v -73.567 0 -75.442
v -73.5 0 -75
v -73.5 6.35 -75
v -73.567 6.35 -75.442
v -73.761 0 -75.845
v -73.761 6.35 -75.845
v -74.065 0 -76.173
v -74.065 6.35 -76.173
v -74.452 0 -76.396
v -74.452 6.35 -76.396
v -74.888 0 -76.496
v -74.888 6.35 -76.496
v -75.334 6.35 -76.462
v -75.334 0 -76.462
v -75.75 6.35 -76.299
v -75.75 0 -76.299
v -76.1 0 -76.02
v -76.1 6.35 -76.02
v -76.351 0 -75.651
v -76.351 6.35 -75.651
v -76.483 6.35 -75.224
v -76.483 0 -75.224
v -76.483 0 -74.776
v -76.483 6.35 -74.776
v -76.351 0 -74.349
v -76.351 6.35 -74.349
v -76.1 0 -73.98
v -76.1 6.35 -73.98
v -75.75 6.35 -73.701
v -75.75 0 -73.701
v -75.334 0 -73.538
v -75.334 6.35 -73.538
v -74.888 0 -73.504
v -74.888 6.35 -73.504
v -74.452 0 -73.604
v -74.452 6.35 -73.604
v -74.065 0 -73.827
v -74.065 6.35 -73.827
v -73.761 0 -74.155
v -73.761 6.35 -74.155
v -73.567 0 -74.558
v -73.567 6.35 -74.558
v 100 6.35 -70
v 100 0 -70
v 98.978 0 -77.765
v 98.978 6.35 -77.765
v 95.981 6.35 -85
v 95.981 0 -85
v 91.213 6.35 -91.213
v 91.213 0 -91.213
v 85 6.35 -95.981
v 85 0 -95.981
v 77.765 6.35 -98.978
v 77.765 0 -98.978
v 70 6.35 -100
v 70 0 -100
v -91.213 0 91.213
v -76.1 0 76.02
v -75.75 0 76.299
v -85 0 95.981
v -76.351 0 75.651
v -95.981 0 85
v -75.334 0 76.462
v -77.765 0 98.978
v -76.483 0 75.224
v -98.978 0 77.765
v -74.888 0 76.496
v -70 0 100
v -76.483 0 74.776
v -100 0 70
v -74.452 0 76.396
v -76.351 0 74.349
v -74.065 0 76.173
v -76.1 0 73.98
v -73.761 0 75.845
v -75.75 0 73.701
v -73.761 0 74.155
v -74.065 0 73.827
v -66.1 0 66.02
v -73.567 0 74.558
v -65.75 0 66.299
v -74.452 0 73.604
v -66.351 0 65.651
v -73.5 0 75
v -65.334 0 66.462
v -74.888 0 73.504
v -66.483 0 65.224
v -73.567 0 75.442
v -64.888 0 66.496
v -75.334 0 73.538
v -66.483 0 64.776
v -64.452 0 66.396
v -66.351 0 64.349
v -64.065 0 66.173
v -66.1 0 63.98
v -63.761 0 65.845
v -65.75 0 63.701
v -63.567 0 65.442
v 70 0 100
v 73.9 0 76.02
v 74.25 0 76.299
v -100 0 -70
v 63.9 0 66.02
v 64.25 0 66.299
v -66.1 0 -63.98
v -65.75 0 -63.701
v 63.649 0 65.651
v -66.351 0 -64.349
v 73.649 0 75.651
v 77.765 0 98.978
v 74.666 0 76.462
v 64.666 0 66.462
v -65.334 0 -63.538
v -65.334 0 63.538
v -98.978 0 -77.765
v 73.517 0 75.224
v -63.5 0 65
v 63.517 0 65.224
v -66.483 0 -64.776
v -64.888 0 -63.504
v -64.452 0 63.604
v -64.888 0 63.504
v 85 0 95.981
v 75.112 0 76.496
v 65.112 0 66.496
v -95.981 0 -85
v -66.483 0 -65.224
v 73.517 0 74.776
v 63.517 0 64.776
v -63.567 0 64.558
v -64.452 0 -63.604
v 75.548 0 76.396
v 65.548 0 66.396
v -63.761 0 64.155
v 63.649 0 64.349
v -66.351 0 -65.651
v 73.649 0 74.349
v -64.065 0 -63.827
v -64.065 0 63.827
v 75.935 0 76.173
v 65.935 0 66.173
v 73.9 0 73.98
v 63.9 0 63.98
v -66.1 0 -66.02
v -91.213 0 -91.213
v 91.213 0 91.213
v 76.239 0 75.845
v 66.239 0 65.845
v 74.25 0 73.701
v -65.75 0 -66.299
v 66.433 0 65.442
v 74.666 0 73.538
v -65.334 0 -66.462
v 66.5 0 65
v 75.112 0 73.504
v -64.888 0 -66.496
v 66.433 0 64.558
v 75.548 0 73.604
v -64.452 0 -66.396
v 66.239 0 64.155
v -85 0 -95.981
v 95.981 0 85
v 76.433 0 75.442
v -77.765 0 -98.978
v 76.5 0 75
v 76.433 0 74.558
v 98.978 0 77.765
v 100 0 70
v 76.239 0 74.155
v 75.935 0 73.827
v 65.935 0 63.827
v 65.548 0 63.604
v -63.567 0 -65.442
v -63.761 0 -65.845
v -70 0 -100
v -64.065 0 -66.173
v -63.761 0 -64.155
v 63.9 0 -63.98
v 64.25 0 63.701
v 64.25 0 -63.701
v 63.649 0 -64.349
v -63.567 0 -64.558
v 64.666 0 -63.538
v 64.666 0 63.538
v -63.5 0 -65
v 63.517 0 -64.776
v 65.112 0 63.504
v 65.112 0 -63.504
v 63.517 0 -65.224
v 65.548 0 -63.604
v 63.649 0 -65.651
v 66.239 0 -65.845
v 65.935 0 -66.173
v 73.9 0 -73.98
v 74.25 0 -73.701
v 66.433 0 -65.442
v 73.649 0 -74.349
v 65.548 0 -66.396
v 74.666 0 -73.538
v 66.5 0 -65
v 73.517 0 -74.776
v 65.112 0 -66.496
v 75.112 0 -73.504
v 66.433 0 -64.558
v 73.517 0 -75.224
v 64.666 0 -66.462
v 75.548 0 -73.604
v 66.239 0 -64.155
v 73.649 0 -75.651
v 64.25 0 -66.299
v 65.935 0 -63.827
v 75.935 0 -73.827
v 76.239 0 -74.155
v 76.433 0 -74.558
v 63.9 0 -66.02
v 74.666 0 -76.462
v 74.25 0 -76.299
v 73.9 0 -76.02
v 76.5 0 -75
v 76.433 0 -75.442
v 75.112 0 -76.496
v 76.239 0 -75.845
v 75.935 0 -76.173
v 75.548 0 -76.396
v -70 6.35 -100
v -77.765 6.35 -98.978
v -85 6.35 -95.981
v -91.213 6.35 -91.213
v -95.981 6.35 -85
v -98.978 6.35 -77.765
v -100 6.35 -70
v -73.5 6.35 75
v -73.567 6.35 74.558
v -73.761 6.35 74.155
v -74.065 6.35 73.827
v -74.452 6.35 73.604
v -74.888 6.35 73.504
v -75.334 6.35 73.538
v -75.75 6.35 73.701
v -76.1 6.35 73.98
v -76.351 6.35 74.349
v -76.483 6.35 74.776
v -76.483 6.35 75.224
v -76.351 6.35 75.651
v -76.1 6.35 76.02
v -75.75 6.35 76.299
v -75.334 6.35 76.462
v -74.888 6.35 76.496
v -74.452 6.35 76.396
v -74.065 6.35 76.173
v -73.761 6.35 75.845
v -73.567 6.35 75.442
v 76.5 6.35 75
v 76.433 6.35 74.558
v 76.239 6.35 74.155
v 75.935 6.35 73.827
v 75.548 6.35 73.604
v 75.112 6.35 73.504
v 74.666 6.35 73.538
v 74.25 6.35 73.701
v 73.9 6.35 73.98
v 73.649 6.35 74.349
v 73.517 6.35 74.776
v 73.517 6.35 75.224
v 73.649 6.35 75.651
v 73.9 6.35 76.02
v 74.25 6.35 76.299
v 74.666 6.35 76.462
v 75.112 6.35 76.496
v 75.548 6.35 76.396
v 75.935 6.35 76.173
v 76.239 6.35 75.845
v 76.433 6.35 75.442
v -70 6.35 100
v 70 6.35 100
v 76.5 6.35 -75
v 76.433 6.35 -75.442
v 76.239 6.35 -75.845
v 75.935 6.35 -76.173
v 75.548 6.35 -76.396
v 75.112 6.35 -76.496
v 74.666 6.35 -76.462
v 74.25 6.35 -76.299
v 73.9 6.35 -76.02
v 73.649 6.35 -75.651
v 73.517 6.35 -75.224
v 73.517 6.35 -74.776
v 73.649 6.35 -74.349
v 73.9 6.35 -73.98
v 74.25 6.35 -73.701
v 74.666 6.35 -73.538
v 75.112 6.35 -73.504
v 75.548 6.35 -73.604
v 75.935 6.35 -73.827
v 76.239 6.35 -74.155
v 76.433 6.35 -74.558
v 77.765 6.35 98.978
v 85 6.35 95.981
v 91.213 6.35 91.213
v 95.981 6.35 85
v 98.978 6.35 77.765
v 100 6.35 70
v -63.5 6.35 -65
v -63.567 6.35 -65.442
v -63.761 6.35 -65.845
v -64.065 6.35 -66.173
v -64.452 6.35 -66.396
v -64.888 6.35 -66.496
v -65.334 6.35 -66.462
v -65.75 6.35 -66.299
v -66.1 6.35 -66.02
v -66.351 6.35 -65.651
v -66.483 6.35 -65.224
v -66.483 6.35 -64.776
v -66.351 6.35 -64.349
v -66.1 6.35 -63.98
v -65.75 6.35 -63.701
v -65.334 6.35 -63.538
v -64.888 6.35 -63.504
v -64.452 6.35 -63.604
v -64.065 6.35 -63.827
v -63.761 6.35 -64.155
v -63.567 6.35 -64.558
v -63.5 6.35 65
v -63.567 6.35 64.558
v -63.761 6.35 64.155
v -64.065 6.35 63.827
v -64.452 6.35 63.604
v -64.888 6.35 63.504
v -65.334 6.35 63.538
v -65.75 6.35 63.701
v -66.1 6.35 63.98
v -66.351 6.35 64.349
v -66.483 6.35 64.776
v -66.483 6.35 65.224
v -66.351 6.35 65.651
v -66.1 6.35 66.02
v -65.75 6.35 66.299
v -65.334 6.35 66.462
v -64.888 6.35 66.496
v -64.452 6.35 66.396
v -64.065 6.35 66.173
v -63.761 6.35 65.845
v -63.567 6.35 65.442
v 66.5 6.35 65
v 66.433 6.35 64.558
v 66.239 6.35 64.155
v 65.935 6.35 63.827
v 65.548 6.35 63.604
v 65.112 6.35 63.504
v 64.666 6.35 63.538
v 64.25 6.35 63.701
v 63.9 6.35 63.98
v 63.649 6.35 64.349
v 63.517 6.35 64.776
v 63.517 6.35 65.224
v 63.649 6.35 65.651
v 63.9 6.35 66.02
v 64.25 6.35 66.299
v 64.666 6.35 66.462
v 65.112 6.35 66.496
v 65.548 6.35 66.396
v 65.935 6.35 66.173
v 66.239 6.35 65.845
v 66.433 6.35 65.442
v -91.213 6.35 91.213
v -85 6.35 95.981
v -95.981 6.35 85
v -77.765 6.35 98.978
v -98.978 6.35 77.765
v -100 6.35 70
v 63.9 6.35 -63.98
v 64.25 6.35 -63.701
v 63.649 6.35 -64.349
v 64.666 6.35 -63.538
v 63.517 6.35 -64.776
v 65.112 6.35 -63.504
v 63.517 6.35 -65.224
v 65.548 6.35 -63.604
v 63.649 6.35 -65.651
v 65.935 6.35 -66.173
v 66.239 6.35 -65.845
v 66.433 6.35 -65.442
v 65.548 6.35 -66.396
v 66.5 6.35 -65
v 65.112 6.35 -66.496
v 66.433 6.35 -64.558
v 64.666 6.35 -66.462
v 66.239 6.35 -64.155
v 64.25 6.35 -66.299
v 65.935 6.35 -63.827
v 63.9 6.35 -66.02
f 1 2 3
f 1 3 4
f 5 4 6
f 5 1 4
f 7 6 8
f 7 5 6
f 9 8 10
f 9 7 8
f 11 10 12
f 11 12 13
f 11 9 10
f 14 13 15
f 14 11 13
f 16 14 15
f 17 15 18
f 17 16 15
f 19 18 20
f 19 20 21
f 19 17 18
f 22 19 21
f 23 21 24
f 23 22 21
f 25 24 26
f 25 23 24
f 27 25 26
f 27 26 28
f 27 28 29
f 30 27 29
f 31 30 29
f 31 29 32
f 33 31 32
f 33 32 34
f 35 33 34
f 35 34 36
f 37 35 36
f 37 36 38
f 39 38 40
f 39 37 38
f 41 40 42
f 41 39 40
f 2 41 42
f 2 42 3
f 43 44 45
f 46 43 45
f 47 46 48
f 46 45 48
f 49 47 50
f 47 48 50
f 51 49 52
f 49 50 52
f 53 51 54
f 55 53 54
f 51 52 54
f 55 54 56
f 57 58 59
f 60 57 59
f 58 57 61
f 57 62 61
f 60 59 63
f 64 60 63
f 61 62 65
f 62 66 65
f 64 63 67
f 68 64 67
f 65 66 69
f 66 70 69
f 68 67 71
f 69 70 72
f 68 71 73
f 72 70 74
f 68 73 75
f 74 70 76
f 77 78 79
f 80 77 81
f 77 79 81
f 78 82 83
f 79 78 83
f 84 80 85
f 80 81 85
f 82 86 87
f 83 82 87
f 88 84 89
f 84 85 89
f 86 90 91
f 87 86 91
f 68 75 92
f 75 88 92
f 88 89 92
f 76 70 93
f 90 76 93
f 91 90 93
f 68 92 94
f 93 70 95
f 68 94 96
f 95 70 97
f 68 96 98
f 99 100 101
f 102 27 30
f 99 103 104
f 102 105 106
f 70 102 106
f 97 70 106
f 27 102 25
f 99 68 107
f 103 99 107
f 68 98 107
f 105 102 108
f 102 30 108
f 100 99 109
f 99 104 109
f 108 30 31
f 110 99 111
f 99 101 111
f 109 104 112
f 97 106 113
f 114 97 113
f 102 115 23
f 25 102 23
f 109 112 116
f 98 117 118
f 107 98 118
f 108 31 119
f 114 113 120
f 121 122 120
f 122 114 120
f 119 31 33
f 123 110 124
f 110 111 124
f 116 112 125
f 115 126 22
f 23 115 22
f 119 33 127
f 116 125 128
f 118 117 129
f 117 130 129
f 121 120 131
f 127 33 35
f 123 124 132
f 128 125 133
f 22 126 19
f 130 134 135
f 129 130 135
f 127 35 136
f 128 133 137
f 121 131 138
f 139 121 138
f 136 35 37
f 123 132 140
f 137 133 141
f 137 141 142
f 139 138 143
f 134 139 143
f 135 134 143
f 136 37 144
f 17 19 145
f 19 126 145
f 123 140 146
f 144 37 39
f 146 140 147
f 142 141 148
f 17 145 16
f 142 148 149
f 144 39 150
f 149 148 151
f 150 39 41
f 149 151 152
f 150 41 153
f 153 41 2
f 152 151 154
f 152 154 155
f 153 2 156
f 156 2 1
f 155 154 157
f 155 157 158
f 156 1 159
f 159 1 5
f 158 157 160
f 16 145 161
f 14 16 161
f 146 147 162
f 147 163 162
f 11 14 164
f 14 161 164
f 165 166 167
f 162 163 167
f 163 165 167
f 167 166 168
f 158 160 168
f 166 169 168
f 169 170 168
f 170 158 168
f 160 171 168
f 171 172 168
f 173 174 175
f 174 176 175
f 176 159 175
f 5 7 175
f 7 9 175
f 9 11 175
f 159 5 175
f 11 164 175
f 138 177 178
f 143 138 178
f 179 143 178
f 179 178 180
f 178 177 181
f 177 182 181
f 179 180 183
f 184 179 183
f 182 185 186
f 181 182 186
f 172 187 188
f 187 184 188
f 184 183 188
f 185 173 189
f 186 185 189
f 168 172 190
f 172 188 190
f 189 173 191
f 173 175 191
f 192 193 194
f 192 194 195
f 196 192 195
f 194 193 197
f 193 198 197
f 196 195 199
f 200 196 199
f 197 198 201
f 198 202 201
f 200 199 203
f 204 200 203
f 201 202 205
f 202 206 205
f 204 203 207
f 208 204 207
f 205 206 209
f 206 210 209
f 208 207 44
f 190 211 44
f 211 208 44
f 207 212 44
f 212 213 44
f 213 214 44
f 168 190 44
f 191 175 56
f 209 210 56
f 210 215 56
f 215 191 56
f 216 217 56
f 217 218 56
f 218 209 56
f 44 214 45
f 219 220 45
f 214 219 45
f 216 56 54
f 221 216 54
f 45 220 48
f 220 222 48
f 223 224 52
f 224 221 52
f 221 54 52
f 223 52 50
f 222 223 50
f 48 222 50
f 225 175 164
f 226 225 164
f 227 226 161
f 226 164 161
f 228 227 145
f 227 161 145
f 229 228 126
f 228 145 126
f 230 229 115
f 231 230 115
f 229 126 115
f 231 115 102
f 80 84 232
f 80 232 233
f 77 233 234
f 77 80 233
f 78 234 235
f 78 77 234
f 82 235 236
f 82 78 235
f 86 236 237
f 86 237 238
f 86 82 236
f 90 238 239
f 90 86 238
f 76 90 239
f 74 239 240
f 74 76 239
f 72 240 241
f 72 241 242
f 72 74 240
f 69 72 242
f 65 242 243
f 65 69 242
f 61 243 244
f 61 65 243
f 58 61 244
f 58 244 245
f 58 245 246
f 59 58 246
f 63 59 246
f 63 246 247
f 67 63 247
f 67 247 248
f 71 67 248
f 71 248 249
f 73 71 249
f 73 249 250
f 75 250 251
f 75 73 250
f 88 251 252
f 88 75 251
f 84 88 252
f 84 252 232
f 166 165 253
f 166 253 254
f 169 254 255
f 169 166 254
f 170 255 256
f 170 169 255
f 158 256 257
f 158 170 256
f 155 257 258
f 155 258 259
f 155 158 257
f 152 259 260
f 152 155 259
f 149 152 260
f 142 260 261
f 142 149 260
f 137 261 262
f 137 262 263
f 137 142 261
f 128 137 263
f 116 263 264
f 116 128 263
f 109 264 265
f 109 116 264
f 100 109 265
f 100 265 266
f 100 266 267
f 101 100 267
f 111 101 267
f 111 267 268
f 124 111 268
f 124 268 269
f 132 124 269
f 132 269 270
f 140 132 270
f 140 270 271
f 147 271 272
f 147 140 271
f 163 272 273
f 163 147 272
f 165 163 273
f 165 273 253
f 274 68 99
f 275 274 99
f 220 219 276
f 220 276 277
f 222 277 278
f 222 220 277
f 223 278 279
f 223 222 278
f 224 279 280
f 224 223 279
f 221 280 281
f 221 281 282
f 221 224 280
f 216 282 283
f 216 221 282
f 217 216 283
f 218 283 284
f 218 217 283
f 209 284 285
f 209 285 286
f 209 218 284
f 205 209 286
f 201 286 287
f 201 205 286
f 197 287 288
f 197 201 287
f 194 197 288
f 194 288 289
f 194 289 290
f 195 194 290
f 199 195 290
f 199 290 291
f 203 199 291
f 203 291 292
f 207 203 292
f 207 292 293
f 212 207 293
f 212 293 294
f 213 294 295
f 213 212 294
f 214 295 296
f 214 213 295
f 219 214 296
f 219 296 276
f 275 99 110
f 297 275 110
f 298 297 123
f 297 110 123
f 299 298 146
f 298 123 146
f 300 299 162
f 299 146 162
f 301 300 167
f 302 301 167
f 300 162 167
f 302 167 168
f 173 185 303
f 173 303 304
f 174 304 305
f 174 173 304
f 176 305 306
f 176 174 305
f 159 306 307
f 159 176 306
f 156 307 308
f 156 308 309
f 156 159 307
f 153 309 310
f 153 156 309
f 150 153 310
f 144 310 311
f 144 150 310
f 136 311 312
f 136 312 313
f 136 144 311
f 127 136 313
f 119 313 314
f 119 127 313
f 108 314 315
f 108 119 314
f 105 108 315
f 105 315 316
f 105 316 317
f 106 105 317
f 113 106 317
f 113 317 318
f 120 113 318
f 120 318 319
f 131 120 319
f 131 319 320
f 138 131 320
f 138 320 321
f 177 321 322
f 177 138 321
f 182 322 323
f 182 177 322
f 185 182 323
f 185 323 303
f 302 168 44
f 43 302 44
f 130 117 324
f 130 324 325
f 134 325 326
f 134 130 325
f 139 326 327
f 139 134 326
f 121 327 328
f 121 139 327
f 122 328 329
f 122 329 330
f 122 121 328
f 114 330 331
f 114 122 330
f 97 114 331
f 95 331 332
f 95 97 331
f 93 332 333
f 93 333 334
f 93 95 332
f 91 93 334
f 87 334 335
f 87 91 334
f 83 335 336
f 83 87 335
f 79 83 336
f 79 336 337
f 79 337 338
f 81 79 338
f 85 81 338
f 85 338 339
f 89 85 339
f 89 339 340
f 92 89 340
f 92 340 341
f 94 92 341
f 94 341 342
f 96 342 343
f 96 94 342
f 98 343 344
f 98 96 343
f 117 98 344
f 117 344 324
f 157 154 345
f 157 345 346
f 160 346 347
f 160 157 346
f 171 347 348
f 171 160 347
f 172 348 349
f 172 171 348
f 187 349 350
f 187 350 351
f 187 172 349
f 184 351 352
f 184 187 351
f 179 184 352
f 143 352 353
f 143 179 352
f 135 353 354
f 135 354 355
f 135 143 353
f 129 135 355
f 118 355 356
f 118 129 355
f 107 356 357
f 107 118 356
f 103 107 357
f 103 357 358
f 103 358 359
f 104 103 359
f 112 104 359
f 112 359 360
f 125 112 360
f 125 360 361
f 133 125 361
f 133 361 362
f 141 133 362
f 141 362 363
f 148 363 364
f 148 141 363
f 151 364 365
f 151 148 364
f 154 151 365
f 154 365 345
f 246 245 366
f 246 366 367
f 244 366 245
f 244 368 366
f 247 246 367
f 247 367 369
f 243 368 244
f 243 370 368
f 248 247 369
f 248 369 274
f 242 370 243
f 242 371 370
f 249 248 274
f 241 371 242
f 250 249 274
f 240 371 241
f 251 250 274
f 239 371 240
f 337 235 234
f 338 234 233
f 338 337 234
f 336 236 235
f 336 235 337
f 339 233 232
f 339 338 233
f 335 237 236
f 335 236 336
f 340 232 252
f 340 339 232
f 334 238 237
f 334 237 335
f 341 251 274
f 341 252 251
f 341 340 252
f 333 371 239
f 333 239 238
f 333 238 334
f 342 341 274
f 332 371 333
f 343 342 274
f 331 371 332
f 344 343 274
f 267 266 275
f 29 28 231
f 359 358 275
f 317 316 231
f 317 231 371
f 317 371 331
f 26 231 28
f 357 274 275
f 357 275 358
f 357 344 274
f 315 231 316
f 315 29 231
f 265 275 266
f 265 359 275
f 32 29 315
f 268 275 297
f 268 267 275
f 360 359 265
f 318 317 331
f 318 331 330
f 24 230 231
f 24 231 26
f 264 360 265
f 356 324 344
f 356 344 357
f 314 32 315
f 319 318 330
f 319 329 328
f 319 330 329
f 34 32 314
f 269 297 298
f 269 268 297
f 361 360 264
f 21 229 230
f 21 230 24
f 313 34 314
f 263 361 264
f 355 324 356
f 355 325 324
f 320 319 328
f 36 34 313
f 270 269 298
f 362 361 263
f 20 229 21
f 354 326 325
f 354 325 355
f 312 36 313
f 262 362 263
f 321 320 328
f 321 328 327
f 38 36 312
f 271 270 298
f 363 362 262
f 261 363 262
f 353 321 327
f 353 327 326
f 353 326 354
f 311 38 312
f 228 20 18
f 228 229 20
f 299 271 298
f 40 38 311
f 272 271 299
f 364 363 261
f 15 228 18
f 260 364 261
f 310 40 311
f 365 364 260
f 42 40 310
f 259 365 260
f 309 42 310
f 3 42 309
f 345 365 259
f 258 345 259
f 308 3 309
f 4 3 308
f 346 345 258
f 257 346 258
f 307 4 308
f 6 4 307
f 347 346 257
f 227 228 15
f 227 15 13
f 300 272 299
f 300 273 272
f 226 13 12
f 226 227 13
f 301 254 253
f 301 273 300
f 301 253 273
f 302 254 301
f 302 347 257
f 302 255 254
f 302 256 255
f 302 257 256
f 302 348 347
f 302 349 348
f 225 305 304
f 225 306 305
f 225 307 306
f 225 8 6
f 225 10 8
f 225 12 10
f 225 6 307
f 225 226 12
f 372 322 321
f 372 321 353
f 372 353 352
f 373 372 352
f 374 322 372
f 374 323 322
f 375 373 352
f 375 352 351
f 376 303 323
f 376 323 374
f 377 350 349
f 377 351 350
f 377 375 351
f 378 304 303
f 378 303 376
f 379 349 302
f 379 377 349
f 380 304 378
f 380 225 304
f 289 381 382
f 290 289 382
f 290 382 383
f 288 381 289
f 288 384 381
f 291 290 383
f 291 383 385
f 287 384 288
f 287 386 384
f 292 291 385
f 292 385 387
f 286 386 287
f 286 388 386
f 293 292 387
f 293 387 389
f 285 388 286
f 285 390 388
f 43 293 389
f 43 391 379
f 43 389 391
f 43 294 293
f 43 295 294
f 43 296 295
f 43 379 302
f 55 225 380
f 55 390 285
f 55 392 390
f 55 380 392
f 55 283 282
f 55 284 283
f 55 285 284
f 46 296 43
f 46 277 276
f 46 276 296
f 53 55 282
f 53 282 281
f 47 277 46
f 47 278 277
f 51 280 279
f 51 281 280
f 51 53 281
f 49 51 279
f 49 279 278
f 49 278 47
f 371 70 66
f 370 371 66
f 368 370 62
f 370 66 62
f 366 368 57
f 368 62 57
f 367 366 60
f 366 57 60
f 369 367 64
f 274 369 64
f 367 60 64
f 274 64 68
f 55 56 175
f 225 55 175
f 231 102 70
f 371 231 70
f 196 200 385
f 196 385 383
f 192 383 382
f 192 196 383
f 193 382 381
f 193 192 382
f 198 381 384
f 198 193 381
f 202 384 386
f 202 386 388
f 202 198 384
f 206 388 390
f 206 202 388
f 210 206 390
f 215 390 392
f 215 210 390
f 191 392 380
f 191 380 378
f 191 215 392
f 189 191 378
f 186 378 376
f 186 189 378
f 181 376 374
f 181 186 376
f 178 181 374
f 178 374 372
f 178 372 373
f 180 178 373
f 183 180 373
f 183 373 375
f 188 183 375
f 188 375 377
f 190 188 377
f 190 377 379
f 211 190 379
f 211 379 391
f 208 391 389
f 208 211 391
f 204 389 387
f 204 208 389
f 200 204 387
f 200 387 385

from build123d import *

# Parameters (mm, degrees)
SKETCH1_R           = 1.5
BOSS_EXTRUDE1_DEPTH = 6.35


with BuildPart() as part:
    # Sketch1 → Boss-Extrude1 (new body)
    with BuildSketch(Plane(origin=(0, 0, 0), x_dir=(1, 0, 0), z_dir=(0, 1, 0))):
        with BuildLine():
            Line((-70, -100), (70, -100))
            ThreePointArc((70, -100), (91.213203436, -91.213203436), (100, -70))
            Line((100, -70), (100, 70))
            ThreePointArc((100, 70), (91.213203436, 91.213203436), (70, 100))
            Line((70, 100), (-70, 100))
            ThreePointArc((-70, 100), (-91.213203436, 91.213203436), (-100, 70))
            Line((-100, 70), (-100, -70))
            ThreePointArc((-100, -70), (-91.213203436, -91.213203436), (-70, -100))
        make_face()
        with Locations((75, 75)):
            Circle(SKETCH1_R, mode=Mode.SUBTRACT)
        with Locations((65, 65)):
            Circle(SKETCH1_R, mode=Mode.SUBTRACT)
        with Locations((65, -65)):
            Circle(SKETCH1_R, mode=Mode.SUBTRACT)
        with Locations((75, -75)):
            Circle(SKETCH1_R, mode=Mode.SUBTRACT)
        with Locations((-65, -65)):
            Circle(SKETCH1_R, mode=Mode.SUBTRACT)
        with Locations((-75, -75)):
            Circle(SKETCH1_R, mode=Mode.SUBTRACT)
        with Locations((-65, 65)):
            Circle(SKETCH1_R, mode=Mode.SUBTRACT)
        with Locations((-75, 75)):
            Circle(SKETCH1_R, mode=Mode.SUBTRACT)
    extrude(amount=BOSS_EXTRUDE1_DEPTH)


solid = part.part
